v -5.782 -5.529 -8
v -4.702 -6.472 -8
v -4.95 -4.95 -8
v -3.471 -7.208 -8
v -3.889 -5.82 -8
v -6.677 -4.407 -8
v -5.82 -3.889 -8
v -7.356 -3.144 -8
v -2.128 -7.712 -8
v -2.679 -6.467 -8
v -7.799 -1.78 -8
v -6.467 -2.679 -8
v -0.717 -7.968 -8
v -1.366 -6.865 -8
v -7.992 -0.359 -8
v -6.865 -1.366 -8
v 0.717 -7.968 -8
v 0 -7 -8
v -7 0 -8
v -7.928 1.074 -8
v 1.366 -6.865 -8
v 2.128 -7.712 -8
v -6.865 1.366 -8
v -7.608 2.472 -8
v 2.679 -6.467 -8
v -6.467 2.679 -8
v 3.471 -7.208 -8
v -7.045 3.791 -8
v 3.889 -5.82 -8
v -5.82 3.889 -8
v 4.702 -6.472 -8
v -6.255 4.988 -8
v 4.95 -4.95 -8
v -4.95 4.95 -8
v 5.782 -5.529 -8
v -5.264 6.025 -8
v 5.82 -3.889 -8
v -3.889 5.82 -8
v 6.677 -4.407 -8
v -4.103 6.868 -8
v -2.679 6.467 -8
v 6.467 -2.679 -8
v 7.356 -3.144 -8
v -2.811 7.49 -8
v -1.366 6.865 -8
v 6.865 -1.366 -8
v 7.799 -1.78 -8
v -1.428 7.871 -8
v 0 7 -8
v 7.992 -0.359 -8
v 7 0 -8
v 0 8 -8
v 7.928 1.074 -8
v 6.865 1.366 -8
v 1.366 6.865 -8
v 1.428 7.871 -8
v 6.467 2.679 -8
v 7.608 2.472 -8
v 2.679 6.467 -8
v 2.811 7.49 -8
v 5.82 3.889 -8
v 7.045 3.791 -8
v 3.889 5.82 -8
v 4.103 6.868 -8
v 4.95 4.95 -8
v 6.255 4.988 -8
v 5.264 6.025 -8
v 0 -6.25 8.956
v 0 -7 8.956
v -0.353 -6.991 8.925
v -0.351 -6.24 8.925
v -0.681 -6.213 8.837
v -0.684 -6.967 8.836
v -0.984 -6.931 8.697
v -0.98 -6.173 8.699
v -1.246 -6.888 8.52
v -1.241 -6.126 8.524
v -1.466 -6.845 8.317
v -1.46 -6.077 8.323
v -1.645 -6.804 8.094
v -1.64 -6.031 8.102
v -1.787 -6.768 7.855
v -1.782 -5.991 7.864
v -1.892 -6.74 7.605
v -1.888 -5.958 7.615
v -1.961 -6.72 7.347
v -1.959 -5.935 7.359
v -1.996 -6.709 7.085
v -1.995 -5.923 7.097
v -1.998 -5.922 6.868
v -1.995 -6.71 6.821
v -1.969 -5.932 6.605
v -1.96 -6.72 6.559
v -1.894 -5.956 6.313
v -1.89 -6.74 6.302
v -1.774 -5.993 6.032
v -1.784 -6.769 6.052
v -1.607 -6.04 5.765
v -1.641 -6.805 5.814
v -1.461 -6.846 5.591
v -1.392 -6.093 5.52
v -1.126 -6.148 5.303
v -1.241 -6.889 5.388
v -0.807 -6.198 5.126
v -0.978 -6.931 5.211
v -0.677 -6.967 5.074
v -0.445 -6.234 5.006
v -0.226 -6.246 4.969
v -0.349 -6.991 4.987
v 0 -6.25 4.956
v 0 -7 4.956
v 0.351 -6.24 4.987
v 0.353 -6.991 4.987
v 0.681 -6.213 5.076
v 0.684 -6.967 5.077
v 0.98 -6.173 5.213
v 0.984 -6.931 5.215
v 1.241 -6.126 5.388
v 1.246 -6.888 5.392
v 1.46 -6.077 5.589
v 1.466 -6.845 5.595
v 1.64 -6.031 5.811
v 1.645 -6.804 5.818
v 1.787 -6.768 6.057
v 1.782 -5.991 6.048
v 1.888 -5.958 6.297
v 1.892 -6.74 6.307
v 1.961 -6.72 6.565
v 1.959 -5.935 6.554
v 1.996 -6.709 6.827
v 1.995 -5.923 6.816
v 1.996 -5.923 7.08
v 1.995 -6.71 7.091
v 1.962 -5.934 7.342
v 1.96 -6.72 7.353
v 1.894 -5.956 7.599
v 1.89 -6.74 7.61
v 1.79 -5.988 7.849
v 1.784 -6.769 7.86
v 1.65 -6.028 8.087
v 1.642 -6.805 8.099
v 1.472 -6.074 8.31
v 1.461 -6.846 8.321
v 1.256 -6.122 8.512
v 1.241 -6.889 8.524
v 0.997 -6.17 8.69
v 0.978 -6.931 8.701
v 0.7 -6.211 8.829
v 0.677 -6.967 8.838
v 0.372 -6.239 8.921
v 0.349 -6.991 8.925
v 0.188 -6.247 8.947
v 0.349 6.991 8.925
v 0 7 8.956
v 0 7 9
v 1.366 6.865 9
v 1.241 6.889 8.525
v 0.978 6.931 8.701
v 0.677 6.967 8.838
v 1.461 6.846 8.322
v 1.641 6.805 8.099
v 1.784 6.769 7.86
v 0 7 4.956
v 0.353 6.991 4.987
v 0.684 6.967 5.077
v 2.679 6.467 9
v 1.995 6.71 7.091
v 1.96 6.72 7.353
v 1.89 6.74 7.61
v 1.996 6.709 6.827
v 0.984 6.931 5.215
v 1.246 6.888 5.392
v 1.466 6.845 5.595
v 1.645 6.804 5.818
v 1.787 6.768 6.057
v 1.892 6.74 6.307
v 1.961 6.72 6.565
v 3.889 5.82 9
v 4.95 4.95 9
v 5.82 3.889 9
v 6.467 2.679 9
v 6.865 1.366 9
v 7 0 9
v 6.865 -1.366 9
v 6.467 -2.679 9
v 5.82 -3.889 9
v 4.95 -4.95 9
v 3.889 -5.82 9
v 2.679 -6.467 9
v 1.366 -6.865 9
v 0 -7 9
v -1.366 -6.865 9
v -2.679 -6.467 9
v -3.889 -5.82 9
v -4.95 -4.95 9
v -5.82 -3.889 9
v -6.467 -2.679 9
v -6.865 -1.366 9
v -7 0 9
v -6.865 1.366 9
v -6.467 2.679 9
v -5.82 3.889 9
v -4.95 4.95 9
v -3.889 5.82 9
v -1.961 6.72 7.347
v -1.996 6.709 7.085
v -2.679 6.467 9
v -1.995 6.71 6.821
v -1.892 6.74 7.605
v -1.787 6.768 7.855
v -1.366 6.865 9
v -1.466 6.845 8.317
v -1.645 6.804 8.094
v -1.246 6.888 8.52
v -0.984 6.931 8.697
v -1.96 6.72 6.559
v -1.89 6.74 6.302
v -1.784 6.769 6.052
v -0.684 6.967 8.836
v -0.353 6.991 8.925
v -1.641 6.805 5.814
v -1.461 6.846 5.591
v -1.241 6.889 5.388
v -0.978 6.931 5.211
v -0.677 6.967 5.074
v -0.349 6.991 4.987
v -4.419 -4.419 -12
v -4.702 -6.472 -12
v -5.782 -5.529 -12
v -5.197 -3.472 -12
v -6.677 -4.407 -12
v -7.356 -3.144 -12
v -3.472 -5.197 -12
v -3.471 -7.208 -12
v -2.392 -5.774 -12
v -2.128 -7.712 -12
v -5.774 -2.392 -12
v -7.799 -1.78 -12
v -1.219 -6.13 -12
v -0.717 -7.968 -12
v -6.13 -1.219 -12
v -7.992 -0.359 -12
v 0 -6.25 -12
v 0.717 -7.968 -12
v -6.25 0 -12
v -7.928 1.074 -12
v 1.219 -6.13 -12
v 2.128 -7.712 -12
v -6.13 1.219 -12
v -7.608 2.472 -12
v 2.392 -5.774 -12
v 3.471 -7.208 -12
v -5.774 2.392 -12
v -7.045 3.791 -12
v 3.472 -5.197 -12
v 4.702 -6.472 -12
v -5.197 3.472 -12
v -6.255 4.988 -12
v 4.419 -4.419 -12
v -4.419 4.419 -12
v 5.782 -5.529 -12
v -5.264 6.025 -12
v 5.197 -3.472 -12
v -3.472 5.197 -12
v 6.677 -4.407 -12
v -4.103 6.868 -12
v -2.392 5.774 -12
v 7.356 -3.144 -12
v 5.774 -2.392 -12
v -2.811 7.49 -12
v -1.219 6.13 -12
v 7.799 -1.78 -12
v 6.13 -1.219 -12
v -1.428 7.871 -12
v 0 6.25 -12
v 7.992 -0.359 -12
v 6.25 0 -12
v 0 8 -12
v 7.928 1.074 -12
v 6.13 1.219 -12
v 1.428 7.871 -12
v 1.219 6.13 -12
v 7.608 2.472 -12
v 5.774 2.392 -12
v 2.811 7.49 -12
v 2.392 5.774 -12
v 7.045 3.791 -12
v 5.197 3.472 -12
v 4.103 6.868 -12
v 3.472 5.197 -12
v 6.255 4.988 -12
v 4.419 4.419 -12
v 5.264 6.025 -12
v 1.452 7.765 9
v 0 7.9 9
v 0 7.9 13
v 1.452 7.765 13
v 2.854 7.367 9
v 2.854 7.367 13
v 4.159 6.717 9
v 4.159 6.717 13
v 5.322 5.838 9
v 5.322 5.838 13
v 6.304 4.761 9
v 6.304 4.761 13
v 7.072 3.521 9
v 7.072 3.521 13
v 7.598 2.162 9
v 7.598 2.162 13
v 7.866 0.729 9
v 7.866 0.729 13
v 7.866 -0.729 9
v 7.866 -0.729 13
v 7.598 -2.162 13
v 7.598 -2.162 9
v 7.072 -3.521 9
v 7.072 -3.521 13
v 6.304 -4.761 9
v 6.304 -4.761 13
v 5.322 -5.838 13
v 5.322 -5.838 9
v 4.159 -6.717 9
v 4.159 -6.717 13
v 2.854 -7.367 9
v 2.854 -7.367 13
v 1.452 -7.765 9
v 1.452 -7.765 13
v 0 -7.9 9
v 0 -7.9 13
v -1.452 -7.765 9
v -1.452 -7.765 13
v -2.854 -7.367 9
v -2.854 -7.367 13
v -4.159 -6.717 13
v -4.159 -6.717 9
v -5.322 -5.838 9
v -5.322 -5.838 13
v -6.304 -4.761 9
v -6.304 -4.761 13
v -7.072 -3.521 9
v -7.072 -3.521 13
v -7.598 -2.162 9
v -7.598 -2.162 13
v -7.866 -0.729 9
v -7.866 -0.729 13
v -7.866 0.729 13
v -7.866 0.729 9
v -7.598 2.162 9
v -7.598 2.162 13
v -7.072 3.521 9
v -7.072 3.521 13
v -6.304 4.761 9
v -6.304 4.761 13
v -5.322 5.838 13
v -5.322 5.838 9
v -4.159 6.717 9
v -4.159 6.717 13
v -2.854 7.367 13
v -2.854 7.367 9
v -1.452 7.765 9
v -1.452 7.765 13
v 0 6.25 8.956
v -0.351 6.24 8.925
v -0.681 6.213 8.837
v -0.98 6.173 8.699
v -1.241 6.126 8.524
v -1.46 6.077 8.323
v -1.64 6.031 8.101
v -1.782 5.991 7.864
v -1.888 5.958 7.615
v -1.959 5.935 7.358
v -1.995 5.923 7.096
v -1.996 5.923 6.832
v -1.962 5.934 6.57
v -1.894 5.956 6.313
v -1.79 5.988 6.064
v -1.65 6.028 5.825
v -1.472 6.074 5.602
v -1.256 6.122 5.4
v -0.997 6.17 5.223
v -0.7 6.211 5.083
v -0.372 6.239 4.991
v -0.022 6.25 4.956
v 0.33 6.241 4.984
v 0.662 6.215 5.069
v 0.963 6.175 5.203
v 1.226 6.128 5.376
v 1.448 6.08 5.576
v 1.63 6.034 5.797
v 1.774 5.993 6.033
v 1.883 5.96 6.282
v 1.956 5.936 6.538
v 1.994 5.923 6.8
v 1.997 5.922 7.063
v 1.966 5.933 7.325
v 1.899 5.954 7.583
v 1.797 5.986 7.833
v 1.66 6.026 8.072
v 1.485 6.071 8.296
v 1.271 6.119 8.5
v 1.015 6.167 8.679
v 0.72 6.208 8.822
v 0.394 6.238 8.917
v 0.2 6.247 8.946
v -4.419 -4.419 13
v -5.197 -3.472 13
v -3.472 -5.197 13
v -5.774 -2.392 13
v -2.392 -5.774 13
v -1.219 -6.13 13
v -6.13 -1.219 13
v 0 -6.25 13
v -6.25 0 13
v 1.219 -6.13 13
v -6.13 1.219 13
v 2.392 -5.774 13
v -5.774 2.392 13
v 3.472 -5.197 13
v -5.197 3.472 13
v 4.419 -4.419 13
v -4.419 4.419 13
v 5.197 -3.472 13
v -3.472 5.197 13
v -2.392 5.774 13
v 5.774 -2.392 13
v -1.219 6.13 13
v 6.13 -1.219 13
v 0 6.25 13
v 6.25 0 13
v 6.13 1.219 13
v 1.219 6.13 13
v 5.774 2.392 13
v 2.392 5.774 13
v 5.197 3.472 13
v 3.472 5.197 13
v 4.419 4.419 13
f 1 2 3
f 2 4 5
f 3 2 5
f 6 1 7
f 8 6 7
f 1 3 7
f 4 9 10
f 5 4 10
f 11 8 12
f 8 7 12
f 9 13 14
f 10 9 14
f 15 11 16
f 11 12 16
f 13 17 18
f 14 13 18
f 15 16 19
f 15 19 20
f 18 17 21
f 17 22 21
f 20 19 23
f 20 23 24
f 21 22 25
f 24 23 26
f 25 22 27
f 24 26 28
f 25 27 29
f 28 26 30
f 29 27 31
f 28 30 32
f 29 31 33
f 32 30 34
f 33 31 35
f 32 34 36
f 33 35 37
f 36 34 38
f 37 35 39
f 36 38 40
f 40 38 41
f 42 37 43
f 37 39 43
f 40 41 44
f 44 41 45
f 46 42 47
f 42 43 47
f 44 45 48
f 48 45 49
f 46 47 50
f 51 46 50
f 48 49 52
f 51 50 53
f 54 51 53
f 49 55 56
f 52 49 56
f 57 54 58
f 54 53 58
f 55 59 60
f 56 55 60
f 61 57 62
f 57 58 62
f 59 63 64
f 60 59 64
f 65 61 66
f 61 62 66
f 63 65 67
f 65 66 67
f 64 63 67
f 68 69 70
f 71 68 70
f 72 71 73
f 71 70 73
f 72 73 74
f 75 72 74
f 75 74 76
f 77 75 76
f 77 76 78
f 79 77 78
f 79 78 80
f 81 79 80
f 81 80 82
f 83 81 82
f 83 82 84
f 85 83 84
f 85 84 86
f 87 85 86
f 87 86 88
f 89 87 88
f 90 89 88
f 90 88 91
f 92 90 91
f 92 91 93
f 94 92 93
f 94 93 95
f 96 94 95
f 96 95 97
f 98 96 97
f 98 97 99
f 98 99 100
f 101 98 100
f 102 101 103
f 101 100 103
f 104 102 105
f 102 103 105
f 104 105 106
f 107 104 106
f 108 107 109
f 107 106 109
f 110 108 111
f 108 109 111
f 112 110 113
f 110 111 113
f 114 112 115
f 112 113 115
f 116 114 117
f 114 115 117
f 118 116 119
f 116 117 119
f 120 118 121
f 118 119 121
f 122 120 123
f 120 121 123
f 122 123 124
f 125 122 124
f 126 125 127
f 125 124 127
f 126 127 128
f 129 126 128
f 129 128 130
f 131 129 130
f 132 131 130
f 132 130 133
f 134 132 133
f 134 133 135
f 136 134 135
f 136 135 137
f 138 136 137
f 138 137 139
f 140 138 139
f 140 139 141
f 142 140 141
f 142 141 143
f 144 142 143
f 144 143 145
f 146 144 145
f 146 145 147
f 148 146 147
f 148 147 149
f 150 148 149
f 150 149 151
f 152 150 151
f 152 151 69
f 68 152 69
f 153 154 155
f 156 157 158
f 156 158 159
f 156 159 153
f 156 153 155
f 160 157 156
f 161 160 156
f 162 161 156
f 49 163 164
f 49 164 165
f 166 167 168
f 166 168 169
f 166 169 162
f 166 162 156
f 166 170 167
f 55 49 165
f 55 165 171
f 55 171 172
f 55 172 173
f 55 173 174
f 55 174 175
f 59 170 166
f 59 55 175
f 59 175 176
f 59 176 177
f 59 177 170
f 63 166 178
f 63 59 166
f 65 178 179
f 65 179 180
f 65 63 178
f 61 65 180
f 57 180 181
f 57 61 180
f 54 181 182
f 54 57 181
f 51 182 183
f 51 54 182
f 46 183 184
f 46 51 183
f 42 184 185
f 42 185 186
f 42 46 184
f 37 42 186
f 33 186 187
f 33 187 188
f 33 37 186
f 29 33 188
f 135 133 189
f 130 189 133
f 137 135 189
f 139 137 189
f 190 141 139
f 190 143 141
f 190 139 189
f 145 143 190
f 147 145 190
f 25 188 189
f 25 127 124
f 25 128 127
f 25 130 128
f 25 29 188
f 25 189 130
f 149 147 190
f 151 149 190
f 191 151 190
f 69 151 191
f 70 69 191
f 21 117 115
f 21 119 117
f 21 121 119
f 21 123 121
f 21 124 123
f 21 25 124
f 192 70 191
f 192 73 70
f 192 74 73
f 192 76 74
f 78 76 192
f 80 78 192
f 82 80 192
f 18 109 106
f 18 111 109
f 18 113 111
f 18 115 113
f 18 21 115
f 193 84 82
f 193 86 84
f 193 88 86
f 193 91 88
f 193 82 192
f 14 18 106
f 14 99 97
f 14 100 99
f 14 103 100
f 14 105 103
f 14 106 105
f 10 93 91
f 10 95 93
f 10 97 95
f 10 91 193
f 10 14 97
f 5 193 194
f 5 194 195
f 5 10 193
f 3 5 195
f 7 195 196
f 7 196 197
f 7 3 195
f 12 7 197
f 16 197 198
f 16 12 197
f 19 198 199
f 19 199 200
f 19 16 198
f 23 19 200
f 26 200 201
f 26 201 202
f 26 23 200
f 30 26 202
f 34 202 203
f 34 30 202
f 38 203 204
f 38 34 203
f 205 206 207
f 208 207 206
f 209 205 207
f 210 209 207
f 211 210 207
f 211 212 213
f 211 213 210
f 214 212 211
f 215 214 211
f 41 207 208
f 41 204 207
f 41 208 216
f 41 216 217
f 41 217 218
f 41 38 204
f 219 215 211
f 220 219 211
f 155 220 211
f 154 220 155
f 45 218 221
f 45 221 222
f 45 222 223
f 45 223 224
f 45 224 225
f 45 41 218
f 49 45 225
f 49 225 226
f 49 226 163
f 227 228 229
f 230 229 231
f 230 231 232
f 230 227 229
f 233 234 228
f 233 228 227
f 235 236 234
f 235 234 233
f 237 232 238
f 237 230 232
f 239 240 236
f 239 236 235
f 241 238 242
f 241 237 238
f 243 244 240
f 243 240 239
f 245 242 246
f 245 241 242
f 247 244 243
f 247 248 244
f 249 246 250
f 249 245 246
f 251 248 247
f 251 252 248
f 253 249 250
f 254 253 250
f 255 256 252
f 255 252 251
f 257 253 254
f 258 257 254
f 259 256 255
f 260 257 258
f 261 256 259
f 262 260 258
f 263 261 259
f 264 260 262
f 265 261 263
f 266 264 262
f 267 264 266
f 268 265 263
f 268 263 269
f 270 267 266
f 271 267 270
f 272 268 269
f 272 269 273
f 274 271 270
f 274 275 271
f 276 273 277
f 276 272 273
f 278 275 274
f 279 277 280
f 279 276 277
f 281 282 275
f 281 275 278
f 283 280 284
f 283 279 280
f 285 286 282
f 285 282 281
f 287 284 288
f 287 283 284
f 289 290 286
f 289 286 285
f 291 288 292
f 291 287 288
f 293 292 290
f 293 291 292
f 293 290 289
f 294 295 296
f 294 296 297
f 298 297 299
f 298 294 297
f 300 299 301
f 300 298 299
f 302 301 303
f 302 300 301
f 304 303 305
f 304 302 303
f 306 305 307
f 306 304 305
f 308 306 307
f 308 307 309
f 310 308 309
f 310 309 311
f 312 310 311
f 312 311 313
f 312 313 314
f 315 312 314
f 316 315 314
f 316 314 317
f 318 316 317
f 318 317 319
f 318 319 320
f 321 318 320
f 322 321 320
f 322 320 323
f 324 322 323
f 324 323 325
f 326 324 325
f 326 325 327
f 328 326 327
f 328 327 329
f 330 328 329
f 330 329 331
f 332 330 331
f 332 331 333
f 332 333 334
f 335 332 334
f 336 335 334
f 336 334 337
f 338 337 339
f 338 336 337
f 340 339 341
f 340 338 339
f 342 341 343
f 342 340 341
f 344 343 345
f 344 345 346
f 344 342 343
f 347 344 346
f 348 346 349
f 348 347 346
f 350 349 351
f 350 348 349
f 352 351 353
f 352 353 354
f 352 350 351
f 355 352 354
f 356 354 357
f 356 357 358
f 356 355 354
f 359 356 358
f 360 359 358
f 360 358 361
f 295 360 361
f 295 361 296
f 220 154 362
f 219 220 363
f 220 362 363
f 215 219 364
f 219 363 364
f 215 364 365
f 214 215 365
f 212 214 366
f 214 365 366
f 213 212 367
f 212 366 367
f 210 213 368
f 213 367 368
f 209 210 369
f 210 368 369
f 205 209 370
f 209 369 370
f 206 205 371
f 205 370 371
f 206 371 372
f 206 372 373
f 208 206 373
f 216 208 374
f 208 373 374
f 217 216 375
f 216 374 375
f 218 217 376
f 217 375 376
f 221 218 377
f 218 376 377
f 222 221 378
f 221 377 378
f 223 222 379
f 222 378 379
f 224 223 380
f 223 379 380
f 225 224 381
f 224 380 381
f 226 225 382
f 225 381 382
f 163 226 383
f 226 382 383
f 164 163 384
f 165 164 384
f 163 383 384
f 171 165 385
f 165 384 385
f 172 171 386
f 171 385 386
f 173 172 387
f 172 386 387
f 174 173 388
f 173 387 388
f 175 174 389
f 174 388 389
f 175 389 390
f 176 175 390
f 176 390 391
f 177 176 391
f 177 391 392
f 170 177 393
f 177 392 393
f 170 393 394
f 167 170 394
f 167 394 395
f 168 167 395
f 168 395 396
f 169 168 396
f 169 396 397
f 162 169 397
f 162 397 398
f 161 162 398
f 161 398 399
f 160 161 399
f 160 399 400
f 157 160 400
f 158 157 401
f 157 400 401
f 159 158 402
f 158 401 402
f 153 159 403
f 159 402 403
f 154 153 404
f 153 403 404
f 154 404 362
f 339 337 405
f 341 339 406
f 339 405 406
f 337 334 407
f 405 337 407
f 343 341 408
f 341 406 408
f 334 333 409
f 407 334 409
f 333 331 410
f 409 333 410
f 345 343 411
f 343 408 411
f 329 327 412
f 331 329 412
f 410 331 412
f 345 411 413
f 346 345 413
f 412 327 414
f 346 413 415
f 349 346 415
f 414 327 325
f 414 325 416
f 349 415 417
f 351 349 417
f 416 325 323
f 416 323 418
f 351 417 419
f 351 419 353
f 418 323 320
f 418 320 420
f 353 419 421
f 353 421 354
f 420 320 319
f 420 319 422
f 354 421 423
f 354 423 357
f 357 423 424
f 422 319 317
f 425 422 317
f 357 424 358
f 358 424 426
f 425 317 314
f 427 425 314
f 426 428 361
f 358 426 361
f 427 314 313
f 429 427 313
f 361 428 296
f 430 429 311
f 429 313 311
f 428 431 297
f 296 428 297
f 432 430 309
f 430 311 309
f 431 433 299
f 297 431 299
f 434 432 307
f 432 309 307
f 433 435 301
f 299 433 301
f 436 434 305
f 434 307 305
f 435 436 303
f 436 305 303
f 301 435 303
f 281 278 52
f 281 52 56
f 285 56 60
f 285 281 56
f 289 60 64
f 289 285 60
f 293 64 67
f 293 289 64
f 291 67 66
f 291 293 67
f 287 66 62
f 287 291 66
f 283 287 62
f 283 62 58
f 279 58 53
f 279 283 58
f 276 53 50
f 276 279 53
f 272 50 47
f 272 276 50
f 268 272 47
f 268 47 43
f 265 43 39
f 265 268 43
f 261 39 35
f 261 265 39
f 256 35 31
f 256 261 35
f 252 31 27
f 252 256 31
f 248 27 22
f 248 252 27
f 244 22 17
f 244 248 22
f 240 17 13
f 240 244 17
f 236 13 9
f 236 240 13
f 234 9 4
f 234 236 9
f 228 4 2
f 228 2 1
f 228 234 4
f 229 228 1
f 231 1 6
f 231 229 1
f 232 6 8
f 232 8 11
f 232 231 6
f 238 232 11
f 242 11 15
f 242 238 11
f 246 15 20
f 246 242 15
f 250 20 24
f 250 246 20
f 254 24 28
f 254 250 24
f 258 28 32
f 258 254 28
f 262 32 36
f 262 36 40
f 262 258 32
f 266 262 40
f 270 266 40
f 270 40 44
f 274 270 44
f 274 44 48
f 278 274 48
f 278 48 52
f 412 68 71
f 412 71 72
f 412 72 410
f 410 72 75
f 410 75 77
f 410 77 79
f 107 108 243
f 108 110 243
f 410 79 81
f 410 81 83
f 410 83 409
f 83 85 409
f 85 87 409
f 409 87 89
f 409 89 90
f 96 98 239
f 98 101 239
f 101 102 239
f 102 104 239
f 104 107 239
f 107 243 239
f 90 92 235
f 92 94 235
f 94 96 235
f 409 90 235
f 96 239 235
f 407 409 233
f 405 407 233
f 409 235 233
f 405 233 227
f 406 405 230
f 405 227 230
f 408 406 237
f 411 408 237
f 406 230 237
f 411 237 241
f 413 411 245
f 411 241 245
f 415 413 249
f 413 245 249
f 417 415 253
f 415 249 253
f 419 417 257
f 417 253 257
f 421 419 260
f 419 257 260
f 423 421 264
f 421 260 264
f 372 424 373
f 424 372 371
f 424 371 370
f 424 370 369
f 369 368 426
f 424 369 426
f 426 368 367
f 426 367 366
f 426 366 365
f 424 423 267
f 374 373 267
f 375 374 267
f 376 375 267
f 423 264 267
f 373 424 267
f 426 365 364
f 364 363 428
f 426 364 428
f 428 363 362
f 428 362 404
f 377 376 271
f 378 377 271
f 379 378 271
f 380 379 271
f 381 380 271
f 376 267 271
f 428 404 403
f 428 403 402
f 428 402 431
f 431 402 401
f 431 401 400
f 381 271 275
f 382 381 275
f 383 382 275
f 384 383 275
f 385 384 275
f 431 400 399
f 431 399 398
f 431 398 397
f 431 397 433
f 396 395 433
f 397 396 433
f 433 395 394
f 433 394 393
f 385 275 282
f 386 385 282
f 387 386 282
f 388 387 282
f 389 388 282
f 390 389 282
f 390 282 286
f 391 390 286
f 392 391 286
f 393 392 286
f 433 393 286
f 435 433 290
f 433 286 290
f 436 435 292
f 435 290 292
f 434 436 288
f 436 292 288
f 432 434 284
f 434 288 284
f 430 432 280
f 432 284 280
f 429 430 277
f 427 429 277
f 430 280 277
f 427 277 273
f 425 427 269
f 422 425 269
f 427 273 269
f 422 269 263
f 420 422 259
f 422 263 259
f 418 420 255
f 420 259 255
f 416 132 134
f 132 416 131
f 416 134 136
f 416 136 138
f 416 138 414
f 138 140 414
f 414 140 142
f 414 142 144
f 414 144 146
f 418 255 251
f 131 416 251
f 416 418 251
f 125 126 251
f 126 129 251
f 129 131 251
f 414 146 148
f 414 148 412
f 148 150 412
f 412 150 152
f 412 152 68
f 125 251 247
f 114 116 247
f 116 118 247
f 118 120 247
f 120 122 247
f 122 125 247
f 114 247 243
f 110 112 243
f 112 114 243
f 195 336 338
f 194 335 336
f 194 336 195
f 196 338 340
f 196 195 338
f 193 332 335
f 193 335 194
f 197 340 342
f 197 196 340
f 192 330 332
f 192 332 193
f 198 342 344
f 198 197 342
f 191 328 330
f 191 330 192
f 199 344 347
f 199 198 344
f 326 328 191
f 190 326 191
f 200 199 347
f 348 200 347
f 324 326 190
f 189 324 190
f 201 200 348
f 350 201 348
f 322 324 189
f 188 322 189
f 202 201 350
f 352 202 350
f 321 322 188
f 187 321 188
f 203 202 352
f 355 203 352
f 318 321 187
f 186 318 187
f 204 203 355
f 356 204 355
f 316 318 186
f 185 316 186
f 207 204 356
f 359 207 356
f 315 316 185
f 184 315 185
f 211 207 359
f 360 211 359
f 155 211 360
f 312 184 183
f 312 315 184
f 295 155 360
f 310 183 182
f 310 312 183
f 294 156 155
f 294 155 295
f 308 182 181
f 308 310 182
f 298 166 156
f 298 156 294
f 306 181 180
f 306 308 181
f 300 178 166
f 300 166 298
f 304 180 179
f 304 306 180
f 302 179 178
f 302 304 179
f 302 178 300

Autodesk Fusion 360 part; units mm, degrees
sketch "Skizze1" plane through (0, 0, 0) normal (1, 0, 0) x (0, 0, -1)
  line L0 (-75, 0) -> (90, 0)
  line L1 (-13, 0) -> (-13, 7.9)
  line L2 (-13, 7.9) -> (-9, 7.9)
  line L3 (-9, 7.9) -> (-9, 7)
  line L4 (-9, 7) -> (8, 7)
  line L5 (8, 7) -> (8, 8)
  line L6 (8, 8) -> (12, 8)
  line L7 (12, 8) -> (12, 0)
  dimension "d1" = 7.9
  dimension "d2" = 4
  dimension "d3" = 17
  dimension "d4" = 4
revolve "Drehen1" add sketch "Skizze1" angle 360 about axis through (0, 0, 75) along (0, 0, -1) makes body 1
hole "Bohrung1" at (0, 0, 13) direction (0, 0, -1) diameter 12.5 end through all bodies 1 1
ref_plane "Arbeitsebene2" through (0, 7, 0.9561) normal (0, 1, 0) x (-1, 0, 0)
sketch "Skizze3" plane through (0, 7, 0.9561) normal (0, 1, 0) x (1, 0, 0)
  point P0 (0, -6)
hole "Bohrung2" at (0, 7, 6.9561) direction (0, -1, 0) diameter 4 depth 14 tip angle 180 bodies 1
copy_body "Körper->Berechn1" bodies 1 removing the originals makes body 2 in component "gasChargingCryoarmGuide"
component "gasChargingCryoarmGuide" placed x (1, 0, 0) y (0, 1, 0) z (0, 0, 1) at (0, 0, 0)
equation "d1 = ( 15.8 / 2 ) * 1 mm"
